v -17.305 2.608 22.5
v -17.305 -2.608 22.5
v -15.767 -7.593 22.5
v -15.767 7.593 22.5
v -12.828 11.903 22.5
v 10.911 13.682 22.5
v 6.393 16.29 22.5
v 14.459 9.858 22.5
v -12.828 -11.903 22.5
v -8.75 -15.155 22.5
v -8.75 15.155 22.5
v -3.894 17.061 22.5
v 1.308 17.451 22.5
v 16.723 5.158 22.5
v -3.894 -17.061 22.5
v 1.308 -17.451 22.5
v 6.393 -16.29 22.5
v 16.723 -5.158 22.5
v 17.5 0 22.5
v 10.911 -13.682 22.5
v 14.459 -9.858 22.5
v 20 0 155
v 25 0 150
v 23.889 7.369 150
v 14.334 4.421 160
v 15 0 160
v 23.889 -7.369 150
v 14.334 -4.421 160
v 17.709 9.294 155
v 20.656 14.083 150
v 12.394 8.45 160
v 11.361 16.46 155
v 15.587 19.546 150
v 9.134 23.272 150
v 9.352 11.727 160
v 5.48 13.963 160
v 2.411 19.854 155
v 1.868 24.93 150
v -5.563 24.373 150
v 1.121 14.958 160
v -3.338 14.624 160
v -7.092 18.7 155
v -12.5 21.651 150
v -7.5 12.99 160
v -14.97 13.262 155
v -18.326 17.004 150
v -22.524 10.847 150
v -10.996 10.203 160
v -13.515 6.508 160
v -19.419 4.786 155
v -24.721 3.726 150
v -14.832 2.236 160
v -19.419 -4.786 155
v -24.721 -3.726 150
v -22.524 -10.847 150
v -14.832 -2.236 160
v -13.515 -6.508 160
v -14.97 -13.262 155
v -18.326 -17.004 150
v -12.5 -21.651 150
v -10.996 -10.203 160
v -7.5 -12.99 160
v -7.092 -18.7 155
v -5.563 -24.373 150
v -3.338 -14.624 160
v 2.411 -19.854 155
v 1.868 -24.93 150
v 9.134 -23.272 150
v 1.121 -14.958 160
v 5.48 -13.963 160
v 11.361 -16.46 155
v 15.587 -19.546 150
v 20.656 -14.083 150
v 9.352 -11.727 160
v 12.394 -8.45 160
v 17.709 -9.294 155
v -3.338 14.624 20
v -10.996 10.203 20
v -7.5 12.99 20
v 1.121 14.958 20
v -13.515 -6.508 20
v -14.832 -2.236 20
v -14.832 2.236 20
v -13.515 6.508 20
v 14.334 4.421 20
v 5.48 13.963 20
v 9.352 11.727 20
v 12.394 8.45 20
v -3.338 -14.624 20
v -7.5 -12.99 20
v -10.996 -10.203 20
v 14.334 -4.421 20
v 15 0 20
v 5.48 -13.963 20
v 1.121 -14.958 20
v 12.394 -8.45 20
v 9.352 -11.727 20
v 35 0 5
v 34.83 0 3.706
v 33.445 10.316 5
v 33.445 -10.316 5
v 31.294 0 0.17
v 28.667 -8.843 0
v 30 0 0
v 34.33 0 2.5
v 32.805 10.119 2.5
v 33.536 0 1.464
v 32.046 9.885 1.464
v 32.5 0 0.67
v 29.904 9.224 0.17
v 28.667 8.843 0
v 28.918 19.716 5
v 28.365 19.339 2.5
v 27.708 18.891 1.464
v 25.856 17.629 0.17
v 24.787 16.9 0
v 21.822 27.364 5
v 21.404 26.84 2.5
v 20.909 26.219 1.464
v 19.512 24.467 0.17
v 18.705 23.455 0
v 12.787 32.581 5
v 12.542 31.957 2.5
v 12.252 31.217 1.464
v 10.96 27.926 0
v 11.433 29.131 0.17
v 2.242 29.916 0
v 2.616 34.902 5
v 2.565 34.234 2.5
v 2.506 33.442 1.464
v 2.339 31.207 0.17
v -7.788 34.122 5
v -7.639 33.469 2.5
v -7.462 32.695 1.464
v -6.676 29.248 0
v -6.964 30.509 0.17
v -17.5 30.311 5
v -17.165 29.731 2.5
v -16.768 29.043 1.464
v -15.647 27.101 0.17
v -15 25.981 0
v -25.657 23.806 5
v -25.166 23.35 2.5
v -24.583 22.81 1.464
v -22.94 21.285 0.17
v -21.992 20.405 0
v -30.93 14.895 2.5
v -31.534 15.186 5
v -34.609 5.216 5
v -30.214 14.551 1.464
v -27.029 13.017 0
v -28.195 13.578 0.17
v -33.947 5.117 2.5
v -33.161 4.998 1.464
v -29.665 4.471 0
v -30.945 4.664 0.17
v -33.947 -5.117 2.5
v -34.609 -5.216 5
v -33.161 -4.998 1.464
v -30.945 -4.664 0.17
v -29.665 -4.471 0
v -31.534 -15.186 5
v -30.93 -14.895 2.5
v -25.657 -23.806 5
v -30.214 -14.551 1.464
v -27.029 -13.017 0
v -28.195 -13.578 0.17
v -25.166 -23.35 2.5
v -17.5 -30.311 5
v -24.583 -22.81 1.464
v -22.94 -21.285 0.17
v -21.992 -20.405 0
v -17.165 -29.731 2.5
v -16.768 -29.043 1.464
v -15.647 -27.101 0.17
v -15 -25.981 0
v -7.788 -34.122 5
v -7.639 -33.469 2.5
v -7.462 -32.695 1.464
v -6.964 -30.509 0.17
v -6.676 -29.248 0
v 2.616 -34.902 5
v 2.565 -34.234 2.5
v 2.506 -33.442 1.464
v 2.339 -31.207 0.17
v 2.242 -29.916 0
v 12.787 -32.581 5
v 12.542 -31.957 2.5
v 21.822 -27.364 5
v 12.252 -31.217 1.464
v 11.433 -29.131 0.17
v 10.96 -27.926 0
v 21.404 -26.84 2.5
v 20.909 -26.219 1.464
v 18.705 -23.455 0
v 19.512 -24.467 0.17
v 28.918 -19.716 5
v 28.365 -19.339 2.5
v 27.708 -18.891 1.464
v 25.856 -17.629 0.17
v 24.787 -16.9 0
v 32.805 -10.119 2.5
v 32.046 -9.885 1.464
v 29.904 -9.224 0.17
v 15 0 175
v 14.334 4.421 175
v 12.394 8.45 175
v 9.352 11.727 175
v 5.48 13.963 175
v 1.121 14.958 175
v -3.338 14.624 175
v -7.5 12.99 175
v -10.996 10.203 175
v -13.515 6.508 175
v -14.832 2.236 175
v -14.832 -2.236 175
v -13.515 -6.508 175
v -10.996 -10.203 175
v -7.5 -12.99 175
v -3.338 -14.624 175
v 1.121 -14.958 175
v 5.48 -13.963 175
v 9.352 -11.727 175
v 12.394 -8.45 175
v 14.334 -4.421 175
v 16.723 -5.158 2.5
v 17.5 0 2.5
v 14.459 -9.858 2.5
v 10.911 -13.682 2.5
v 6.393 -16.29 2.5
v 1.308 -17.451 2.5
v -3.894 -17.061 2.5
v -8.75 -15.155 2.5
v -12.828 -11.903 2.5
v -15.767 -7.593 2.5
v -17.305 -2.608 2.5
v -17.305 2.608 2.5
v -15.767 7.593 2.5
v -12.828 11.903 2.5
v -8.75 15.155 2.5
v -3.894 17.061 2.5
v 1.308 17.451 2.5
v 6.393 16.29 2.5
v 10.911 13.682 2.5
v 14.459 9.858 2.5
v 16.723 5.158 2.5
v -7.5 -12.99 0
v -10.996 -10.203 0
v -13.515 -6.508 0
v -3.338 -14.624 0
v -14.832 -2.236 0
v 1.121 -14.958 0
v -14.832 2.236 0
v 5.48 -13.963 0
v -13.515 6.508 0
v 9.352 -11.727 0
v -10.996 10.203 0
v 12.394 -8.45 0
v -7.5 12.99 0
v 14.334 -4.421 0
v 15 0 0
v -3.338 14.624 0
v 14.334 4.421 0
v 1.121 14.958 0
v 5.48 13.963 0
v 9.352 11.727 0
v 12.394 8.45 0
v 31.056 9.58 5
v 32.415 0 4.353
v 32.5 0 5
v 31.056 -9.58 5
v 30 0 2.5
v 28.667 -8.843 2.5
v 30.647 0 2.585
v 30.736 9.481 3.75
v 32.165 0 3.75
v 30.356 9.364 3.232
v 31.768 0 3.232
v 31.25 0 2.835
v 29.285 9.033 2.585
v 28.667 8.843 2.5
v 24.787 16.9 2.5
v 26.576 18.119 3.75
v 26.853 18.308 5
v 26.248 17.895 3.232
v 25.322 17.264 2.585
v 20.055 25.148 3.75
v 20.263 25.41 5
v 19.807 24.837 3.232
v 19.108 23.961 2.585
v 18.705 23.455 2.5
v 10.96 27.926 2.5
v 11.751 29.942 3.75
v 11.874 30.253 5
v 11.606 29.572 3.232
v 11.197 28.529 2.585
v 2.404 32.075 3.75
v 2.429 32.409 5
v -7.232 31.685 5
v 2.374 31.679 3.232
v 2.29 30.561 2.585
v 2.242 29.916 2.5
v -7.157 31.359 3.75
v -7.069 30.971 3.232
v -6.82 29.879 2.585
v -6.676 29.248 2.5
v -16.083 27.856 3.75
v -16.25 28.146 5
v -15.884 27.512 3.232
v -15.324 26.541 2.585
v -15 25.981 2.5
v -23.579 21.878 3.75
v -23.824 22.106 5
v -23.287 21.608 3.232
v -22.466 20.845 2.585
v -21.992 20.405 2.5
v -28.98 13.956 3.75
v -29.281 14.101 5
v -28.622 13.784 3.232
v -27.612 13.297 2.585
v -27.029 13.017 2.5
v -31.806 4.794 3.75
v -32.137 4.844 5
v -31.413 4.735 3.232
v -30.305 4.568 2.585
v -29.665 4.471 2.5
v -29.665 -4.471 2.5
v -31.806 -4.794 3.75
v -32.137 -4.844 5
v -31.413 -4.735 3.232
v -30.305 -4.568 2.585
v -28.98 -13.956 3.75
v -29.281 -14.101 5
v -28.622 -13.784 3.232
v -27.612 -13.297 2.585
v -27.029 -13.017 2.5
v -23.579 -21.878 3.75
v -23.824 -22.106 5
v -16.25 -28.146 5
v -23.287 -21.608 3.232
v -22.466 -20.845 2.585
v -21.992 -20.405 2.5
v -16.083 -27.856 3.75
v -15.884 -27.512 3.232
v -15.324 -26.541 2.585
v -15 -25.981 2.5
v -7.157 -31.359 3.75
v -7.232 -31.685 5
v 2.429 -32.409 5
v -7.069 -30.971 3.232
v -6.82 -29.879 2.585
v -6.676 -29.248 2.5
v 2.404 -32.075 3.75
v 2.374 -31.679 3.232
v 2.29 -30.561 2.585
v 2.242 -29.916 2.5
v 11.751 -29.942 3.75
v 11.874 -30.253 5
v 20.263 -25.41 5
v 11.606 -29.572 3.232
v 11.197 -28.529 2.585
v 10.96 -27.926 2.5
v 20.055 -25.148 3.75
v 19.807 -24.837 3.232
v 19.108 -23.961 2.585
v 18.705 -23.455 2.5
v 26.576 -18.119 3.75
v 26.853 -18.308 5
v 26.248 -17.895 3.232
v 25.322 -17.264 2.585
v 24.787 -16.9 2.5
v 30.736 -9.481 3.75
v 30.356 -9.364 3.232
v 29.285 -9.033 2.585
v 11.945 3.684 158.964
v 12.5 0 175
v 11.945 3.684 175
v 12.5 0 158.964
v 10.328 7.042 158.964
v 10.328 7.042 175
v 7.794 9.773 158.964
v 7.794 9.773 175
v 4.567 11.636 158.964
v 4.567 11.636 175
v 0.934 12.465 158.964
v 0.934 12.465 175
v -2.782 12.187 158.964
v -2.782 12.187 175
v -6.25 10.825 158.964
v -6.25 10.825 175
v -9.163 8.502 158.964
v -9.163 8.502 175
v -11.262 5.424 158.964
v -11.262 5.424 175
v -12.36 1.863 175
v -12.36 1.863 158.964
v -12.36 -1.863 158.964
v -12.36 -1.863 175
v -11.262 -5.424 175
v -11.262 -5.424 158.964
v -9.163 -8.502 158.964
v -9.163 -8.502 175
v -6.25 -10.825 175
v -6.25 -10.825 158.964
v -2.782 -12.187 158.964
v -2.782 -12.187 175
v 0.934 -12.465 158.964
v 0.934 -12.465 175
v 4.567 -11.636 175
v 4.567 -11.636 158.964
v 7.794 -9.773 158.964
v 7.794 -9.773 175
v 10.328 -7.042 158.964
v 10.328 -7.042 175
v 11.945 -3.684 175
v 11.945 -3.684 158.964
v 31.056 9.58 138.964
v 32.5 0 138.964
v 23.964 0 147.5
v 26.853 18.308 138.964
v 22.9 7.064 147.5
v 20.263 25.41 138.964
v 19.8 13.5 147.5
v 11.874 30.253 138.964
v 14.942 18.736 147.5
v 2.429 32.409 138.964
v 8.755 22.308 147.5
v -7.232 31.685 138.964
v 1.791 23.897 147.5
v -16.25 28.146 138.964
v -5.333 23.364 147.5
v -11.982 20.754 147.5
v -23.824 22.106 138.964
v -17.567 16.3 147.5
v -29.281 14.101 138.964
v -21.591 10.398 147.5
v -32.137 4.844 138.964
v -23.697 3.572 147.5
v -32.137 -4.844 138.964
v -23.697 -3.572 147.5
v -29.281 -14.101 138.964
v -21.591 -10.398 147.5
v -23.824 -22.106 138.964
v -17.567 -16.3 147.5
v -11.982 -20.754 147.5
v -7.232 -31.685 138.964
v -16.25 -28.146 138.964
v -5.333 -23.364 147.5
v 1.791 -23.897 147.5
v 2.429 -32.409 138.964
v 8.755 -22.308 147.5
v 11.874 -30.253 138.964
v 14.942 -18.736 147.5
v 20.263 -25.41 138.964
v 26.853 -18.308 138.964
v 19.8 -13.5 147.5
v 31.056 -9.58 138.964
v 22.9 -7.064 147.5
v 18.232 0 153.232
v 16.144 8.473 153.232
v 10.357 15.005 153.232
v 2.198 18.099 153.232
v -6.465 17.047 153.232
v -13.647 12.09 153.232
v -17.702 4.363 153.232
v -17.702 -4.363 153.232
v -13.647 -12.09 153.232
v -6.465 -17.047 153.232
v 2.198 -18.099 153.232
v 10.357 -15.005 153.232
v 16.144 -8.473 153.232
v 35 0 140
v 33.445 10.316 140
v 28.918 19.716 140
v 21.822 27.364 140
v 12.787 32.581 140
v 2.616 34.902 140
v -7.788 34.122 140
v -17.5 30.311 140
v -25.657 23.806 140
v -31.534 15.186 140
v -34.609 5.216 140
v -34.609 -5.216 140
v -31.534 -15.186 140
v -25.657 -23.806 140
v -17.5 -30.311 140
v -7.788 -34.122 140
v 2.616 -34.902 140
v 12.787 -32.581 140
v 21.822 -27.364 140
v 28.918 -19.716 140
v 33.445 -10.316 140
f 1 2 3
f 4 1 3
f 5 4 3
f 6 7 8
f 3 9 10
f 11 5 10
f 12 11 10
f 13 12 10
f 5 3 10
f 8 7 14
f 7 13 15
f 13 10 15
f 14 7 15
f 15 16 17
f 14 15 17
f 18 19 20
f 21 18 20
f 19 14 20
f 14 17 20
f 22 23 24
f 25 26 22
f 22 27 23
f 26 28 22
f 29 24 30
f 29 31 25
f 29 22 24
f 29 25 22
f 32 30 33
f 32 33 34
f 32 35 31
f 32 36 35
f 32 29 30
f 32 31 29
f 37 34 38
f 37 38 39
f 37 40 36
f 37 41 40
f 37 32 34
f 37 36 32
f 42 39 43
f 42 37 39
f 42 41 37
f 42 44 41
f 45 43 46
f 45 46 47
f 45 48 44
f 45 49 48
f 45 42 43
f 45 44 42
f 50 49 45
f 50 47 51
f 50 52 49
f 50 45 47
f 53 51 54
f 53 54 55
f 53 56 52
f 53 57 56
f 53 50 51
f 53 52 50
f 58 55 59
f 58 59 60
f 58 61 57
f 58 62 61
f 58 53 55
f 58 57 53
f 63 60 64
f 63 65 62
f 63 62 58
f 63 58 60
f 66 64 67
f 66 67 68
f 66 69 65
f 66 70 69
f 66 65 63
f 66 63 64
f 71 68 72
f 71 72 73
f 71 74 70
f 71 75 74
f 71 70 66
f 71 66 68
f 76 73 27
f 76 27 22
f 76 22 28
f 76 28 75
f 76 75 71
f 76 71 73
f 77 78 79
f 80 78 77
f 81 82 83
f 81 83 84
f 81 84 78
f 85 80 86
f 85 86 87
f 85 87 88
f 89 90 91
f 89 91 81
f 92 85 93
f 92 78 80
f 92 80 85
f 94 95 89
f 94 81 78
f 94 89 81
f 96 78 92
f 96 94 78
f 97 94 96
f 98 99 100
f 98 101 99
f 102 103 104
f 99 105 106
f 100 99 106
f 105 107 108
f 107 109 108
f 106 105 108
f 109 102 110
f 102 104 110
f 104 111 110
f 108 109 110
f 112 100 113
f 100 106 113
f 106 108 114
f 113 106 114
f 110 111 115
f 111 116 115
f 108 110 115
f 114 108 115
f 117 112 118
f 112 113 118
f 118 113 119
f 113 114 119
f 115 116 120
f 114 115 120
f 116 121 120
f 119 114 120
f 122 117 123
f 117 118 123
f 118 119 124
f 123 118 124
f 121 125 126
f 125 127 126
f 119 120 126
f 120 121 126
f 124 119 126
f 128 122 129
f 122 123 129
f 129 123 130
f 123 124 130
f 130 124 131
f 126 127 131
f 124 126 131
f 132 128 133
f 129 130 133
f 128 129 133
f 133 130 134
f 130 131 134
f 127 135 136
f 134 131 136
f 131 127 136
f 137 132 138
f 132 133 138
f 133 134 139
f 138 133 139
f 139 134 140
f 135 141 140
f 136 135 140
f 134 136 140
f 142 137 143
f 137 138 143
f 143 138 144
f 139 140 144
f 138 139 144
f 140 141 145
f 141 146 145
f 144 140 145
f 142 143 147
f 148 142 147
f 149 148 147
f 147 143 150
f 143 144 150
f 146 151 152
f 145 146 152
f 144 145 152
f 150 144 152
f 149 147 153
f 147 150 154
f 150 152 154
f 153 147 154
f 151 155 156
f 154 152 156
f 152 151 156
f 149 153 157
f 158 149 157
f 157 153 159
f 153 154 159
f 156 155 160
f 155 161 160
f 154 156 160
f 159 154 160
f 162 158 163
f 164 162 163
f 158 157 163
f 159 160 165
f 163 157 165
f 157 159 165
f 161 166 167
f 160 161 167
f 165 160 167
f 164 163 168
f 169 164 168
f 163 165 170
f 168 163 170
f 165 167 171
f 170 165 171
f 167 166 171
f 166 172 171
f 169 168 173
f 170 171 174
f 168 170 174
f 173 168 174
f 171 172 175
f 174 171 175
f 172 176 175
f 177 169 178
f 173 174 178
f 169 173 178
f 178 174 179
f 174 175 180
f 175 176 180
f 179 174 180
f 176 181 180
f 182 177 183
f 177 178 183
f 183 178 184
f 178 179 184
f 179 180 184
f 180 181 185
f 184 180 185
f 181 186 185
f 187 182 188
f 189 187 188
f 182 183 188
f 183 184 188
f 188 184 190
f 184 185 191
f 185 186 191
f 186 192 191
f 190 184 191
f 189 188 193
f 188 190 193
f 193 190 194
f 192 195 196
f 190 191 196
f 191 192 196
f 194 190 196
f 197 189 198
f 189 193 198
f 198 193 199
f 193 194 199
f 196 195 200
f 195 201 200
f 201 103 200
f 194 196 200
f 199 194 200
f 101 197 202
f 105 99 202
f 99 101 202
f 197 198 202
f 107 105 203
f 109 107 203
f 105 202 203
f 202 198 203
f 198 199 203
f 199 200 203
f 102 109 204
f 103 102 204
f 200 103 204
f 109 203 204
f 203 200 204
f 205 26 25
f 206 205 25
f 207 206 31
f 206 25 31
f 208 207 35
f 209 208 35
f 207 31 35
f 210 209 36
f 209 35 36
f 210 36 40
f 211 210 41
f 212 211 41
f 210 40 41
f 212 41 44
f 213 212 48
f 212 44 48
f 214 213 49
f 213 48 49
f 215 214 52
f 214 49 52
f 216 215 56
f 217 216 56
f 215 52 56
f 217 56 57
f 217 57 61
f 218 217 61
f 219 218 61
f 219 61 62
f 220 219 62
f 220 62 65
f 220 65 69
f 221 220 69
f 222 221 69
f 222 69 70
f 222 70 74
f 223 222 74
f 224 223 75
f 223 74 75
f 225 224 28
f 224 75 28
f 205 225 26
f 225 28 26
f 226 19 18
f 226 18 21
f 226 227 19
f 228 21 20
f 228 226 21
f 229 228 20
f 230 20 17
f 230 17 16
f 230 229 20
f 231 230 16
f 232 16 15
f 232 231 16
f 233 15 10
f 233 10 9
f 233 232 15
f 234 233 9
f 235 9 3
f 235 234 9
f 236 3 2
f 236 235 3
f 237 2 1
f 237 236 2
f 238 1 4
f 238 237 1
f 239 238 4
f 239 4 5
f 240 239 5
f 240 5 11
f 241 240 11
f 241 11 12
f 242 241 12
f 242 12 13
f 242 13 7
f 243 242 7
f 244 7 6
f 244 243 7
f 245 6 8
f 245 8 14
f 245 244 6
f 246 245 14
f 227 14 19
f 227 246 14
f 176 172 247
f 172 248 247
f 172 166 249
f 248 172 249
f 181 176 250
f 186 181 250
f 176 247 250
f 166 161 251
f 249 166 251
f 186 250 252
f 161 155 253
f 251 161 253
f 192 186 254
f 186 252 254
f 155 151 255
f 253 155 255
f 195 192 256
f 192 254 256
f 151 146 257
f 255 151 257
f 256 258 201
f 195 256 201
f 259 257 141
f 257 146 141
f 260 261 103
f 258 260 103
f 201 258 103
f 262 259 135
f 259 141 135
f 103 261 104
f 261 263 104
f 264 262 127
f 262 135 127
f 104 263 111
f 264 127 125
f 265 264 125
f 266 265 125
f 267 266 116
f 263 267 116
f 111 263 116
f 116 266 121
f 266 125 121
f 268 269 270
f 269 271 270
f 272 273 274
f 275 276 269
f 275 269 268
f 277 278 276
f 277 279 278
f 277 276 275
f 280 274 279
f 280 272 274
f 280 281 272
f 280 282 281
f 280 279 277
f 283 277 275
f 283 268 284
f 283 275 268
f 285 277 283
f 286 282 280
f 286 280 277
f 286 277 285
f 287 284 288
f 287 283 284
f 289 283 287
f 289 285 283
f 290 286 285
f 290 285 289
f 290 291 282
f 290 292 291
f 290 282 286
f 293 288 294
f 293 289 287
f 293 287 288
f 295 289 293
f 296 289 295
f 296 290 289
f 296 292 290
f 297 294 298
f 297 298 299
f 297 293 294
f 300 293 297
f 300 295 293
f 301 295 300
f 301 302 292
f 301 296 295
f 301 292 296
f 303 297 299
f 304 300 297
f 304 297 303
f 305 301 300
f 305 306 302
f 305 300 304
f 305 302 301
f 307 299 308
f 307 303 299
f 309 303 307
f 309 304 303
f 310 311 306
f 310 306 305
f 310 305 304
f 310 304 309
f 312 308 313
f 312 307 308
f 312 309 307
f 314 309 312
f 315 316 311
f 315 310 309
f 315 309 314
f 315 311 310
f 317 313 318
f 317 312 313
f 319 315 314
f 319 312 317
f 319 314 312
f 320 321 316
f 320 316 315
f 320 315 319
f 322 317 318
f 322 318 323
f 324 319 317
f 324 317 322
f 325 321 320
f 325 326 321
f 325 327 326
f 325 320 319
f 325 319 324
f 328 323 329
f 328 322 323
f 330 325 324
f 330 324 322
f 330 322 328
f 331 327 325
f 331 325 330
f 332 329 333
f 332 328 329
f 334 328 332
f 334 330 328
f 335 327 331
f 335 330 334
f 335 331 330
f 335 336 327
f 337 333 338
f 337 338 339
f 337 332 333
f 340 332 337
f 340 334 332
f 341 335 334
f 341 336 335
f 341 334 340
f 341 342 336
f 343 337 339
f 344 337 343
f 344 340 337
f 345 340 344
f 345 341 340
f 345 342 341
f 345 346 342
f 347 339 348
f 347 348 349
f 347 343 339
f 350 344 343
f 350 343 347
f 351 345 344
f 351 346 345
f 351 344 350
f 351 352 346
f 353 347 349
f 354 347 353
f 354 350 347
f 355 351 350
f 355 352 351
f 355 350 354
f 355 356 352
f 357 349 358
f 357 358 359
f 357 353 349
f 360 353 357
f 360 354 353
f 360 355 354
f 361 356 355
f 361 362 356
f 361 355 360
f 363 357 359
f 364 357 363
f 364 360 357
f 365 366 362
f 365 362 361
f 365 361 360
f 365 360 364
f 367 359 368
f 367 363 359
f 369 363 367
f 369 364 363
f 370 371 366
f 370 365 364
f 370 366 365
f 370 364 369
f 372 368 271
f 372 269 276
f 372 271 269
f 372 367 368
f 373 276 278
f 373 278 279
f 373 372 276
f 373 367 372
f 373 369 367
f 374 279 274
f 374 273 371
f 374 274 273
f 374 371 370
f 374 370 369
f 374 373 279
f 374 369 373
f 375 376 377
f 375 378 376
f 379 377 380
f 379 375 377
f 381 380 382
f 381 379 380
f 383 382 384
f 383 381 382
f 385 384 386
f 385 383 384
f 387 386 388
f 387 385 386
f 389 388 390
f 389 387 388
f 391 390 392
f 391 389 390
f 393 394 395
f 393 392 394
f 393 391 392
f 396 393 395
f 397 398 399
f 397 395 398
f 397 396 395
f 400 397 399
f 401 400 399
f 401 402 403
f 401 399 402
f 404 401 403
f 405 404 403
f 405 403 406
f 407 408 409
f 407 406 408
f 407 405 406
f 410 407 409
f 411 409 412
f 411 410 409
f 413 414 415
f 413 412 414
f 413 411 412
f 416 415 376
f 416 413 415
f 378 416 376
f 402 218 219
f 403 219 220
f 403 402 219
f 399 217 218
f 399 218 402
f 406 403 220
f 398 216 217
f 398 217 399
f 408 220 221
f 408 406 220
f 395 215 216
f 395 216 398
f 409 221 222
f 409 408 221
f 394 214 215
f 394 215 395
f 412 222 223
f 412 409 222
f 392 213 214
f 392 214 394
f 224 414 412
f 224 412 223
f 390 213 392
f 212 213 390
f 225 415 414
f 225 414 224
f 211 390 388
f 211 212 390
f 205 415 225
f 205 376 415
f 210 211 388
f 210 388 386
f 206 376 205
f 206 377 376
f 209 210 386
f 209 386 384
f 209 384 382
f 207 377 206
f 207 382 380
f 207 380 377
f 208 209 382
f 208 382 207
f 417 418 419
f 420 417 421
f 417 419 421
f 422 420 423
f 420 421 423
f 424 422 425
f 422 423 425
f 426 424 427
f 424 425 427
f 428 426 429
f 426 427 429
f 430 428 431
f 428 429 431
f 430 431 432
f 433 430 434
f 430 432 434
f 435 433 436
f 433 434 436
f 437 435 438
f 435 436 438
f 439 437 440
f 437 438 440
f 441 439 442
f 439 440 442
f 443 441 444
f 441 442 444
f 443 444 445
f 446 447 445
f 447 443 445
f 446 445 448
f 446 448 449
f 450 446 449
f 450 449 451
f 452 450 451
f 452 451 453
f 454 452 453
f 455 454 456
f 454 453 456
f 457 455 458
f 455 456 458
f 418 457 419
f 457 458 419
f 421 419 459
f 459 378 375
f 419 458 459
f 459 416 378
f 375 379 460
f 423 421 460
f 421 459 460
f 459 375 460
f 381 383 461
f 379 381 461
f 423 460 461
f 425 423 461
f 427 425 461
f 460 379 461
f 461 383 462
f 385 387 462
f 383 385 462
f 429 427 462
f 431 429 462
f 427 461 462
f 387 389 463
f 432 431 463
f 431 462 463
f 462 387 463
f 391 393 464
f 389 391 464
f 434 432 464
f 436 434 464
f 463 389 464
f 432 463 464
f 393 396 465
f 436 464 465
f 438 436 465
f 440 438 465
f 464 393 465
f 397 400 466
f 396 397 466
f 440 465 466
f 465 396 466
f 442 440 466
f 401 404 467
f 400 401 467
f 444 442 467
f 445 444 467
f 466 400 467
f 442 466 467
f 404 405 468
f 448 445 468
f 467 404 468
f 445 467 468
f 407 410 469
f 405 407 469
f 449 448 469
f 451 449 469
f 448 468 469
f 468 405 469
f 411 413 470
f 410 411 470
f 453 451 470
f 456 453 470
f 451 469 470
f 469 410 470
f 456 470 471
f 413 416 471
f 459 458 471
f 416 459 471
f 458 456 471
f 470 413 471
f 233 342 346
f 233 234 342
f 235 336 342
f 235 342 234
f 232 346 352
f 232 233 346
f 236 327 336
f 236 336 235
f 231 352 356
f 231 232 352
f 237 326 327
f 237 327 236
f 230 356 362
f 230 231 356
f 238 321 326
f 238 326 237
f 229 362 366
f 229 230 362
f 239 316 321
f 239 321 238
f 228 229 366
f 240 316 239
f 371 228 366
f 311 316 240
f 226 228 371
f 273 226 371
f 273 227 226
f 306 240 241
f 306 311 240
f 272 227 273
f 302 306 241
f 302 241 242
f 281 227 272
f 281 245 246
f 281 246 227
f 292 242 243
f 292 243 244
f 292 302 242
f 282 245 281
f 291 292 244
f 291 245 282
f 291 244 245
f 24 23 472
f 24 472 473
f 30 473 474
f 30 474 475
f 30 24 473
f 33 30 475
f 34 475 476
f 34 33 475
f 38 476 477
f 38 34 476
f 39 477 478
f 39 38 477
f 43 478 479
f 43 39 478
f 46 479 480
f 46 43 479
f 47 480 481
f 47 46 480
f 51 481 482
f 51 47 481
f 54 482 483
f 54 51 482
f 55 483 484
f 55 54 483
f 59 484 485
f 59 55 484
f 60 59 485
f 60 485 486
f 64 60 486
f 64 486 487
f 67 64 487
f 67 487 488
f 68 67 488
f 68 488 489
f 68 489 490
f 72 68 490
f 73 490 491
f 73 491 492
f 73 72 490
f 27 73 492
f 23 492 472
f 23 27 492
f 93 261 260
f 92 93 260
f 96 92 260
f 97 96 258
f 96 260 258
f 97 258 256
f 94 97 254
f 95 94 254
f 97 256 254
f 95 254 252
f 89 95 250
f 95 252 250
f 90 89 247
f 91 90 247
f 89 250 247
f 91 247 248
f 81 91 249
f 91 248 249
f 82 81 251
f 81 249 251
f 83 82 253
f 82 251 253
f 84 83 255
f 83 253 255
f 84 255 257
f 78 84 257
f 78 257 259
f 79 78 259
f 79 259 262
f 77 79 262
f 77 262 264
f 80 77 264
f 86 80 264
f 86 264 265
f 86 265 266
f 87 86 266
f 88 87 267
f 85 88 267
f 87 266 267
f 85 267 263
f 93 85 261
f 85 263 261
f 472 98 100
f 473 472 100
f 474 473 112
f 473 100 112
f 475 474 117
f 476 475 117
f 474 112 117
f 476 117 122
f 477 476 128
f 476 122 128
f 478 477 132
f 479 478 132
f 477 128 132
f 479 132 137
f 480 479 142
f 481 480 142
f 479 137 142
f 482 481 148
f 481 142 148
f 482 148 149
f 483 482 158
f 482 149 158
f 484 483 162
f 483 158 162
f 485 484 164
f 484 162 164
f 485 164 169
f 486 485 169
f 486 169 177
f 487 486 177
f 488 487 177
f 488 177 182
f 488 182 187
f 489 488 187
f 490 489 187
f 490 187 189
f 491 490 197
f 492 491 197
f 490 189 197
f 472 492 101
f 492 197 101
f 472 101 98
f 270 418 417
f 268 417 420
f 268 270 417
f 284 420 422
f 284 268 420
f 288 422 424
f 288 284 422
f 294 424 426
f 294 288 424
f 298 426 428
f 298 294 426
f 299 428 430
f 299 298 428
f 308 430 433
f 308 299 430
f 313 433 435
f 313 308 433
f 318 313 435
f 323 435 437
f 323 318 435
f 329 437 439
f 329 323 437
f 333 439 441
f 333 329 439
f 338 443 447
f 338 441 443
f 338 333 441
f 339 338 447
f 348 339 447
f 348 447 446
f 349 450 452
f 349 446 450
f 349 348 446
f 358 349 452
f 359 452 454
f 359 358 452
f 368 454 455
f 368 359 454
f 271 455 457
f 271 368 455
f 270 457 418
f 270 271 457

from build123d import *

# Parameters (mm, degrees)
F0_R     = 35
F1_DEPTH = 150
F2_R     = 15
F3_DEPTH = 25
F4_R     = 5
F5_R     = 15
F6_DEPTH = 20
F7_SIZE  = 9.99999
F8_T     = -2.5


# Not quite as in the source:
# - a fillet or chamfer is up to 0.001 mm smaller than in the source, because OpenCascade refuses the exact size


with BuildPart() as f1:
    # F0 (on Top) → F1 (new body)
    with BuildSketch(Plane.XY):
        Circle(F0_R)
    extrude(amount=F1_DEPTH)

    # F2 (on face) → F3 (join)
    with BuildSketch(Plane.XY.offset(150)):
        Circle(F2_R)
    extrude(amount=F3_DEPTH)

    # F4
    f4_edges = [f1.edges().sort_by_distance(p)[0] for p in [
        (-35, 0, 0),
    ]]
    fillet(f4_edges, radius=F4_R)

    # F5 (on face) → F6 (cut)
    with BuildSketch(Plane(origin=(0, 0, 0), x_dir=(1, 0, 0), z_dir=(0, 0, -1))):
        Circle(F5_R)
    extrude(amount=-F6_DEPTH, mode=Mode.SUBTRACT)

    # F7 (size 10 in the source; OpenCascade refuses exactly that, so slightly less here)
    f7_edges = [f1.edges().sort_by_distance(p)[0] for p in [
        (-35, 0, 150),
        (-15, 0, 150),
    ]]
    chamfer(f7_edges, length=F7_SIZE)

    # F8
    f8_openings = [f1.faces().sort_by_distance(p)[0] for p in [
        (0, 0, 175),
    ]]
    offset(amount=F8_T, openings=f8_openings, kind=Kind.INTERSECTION)


solid = f1.part
